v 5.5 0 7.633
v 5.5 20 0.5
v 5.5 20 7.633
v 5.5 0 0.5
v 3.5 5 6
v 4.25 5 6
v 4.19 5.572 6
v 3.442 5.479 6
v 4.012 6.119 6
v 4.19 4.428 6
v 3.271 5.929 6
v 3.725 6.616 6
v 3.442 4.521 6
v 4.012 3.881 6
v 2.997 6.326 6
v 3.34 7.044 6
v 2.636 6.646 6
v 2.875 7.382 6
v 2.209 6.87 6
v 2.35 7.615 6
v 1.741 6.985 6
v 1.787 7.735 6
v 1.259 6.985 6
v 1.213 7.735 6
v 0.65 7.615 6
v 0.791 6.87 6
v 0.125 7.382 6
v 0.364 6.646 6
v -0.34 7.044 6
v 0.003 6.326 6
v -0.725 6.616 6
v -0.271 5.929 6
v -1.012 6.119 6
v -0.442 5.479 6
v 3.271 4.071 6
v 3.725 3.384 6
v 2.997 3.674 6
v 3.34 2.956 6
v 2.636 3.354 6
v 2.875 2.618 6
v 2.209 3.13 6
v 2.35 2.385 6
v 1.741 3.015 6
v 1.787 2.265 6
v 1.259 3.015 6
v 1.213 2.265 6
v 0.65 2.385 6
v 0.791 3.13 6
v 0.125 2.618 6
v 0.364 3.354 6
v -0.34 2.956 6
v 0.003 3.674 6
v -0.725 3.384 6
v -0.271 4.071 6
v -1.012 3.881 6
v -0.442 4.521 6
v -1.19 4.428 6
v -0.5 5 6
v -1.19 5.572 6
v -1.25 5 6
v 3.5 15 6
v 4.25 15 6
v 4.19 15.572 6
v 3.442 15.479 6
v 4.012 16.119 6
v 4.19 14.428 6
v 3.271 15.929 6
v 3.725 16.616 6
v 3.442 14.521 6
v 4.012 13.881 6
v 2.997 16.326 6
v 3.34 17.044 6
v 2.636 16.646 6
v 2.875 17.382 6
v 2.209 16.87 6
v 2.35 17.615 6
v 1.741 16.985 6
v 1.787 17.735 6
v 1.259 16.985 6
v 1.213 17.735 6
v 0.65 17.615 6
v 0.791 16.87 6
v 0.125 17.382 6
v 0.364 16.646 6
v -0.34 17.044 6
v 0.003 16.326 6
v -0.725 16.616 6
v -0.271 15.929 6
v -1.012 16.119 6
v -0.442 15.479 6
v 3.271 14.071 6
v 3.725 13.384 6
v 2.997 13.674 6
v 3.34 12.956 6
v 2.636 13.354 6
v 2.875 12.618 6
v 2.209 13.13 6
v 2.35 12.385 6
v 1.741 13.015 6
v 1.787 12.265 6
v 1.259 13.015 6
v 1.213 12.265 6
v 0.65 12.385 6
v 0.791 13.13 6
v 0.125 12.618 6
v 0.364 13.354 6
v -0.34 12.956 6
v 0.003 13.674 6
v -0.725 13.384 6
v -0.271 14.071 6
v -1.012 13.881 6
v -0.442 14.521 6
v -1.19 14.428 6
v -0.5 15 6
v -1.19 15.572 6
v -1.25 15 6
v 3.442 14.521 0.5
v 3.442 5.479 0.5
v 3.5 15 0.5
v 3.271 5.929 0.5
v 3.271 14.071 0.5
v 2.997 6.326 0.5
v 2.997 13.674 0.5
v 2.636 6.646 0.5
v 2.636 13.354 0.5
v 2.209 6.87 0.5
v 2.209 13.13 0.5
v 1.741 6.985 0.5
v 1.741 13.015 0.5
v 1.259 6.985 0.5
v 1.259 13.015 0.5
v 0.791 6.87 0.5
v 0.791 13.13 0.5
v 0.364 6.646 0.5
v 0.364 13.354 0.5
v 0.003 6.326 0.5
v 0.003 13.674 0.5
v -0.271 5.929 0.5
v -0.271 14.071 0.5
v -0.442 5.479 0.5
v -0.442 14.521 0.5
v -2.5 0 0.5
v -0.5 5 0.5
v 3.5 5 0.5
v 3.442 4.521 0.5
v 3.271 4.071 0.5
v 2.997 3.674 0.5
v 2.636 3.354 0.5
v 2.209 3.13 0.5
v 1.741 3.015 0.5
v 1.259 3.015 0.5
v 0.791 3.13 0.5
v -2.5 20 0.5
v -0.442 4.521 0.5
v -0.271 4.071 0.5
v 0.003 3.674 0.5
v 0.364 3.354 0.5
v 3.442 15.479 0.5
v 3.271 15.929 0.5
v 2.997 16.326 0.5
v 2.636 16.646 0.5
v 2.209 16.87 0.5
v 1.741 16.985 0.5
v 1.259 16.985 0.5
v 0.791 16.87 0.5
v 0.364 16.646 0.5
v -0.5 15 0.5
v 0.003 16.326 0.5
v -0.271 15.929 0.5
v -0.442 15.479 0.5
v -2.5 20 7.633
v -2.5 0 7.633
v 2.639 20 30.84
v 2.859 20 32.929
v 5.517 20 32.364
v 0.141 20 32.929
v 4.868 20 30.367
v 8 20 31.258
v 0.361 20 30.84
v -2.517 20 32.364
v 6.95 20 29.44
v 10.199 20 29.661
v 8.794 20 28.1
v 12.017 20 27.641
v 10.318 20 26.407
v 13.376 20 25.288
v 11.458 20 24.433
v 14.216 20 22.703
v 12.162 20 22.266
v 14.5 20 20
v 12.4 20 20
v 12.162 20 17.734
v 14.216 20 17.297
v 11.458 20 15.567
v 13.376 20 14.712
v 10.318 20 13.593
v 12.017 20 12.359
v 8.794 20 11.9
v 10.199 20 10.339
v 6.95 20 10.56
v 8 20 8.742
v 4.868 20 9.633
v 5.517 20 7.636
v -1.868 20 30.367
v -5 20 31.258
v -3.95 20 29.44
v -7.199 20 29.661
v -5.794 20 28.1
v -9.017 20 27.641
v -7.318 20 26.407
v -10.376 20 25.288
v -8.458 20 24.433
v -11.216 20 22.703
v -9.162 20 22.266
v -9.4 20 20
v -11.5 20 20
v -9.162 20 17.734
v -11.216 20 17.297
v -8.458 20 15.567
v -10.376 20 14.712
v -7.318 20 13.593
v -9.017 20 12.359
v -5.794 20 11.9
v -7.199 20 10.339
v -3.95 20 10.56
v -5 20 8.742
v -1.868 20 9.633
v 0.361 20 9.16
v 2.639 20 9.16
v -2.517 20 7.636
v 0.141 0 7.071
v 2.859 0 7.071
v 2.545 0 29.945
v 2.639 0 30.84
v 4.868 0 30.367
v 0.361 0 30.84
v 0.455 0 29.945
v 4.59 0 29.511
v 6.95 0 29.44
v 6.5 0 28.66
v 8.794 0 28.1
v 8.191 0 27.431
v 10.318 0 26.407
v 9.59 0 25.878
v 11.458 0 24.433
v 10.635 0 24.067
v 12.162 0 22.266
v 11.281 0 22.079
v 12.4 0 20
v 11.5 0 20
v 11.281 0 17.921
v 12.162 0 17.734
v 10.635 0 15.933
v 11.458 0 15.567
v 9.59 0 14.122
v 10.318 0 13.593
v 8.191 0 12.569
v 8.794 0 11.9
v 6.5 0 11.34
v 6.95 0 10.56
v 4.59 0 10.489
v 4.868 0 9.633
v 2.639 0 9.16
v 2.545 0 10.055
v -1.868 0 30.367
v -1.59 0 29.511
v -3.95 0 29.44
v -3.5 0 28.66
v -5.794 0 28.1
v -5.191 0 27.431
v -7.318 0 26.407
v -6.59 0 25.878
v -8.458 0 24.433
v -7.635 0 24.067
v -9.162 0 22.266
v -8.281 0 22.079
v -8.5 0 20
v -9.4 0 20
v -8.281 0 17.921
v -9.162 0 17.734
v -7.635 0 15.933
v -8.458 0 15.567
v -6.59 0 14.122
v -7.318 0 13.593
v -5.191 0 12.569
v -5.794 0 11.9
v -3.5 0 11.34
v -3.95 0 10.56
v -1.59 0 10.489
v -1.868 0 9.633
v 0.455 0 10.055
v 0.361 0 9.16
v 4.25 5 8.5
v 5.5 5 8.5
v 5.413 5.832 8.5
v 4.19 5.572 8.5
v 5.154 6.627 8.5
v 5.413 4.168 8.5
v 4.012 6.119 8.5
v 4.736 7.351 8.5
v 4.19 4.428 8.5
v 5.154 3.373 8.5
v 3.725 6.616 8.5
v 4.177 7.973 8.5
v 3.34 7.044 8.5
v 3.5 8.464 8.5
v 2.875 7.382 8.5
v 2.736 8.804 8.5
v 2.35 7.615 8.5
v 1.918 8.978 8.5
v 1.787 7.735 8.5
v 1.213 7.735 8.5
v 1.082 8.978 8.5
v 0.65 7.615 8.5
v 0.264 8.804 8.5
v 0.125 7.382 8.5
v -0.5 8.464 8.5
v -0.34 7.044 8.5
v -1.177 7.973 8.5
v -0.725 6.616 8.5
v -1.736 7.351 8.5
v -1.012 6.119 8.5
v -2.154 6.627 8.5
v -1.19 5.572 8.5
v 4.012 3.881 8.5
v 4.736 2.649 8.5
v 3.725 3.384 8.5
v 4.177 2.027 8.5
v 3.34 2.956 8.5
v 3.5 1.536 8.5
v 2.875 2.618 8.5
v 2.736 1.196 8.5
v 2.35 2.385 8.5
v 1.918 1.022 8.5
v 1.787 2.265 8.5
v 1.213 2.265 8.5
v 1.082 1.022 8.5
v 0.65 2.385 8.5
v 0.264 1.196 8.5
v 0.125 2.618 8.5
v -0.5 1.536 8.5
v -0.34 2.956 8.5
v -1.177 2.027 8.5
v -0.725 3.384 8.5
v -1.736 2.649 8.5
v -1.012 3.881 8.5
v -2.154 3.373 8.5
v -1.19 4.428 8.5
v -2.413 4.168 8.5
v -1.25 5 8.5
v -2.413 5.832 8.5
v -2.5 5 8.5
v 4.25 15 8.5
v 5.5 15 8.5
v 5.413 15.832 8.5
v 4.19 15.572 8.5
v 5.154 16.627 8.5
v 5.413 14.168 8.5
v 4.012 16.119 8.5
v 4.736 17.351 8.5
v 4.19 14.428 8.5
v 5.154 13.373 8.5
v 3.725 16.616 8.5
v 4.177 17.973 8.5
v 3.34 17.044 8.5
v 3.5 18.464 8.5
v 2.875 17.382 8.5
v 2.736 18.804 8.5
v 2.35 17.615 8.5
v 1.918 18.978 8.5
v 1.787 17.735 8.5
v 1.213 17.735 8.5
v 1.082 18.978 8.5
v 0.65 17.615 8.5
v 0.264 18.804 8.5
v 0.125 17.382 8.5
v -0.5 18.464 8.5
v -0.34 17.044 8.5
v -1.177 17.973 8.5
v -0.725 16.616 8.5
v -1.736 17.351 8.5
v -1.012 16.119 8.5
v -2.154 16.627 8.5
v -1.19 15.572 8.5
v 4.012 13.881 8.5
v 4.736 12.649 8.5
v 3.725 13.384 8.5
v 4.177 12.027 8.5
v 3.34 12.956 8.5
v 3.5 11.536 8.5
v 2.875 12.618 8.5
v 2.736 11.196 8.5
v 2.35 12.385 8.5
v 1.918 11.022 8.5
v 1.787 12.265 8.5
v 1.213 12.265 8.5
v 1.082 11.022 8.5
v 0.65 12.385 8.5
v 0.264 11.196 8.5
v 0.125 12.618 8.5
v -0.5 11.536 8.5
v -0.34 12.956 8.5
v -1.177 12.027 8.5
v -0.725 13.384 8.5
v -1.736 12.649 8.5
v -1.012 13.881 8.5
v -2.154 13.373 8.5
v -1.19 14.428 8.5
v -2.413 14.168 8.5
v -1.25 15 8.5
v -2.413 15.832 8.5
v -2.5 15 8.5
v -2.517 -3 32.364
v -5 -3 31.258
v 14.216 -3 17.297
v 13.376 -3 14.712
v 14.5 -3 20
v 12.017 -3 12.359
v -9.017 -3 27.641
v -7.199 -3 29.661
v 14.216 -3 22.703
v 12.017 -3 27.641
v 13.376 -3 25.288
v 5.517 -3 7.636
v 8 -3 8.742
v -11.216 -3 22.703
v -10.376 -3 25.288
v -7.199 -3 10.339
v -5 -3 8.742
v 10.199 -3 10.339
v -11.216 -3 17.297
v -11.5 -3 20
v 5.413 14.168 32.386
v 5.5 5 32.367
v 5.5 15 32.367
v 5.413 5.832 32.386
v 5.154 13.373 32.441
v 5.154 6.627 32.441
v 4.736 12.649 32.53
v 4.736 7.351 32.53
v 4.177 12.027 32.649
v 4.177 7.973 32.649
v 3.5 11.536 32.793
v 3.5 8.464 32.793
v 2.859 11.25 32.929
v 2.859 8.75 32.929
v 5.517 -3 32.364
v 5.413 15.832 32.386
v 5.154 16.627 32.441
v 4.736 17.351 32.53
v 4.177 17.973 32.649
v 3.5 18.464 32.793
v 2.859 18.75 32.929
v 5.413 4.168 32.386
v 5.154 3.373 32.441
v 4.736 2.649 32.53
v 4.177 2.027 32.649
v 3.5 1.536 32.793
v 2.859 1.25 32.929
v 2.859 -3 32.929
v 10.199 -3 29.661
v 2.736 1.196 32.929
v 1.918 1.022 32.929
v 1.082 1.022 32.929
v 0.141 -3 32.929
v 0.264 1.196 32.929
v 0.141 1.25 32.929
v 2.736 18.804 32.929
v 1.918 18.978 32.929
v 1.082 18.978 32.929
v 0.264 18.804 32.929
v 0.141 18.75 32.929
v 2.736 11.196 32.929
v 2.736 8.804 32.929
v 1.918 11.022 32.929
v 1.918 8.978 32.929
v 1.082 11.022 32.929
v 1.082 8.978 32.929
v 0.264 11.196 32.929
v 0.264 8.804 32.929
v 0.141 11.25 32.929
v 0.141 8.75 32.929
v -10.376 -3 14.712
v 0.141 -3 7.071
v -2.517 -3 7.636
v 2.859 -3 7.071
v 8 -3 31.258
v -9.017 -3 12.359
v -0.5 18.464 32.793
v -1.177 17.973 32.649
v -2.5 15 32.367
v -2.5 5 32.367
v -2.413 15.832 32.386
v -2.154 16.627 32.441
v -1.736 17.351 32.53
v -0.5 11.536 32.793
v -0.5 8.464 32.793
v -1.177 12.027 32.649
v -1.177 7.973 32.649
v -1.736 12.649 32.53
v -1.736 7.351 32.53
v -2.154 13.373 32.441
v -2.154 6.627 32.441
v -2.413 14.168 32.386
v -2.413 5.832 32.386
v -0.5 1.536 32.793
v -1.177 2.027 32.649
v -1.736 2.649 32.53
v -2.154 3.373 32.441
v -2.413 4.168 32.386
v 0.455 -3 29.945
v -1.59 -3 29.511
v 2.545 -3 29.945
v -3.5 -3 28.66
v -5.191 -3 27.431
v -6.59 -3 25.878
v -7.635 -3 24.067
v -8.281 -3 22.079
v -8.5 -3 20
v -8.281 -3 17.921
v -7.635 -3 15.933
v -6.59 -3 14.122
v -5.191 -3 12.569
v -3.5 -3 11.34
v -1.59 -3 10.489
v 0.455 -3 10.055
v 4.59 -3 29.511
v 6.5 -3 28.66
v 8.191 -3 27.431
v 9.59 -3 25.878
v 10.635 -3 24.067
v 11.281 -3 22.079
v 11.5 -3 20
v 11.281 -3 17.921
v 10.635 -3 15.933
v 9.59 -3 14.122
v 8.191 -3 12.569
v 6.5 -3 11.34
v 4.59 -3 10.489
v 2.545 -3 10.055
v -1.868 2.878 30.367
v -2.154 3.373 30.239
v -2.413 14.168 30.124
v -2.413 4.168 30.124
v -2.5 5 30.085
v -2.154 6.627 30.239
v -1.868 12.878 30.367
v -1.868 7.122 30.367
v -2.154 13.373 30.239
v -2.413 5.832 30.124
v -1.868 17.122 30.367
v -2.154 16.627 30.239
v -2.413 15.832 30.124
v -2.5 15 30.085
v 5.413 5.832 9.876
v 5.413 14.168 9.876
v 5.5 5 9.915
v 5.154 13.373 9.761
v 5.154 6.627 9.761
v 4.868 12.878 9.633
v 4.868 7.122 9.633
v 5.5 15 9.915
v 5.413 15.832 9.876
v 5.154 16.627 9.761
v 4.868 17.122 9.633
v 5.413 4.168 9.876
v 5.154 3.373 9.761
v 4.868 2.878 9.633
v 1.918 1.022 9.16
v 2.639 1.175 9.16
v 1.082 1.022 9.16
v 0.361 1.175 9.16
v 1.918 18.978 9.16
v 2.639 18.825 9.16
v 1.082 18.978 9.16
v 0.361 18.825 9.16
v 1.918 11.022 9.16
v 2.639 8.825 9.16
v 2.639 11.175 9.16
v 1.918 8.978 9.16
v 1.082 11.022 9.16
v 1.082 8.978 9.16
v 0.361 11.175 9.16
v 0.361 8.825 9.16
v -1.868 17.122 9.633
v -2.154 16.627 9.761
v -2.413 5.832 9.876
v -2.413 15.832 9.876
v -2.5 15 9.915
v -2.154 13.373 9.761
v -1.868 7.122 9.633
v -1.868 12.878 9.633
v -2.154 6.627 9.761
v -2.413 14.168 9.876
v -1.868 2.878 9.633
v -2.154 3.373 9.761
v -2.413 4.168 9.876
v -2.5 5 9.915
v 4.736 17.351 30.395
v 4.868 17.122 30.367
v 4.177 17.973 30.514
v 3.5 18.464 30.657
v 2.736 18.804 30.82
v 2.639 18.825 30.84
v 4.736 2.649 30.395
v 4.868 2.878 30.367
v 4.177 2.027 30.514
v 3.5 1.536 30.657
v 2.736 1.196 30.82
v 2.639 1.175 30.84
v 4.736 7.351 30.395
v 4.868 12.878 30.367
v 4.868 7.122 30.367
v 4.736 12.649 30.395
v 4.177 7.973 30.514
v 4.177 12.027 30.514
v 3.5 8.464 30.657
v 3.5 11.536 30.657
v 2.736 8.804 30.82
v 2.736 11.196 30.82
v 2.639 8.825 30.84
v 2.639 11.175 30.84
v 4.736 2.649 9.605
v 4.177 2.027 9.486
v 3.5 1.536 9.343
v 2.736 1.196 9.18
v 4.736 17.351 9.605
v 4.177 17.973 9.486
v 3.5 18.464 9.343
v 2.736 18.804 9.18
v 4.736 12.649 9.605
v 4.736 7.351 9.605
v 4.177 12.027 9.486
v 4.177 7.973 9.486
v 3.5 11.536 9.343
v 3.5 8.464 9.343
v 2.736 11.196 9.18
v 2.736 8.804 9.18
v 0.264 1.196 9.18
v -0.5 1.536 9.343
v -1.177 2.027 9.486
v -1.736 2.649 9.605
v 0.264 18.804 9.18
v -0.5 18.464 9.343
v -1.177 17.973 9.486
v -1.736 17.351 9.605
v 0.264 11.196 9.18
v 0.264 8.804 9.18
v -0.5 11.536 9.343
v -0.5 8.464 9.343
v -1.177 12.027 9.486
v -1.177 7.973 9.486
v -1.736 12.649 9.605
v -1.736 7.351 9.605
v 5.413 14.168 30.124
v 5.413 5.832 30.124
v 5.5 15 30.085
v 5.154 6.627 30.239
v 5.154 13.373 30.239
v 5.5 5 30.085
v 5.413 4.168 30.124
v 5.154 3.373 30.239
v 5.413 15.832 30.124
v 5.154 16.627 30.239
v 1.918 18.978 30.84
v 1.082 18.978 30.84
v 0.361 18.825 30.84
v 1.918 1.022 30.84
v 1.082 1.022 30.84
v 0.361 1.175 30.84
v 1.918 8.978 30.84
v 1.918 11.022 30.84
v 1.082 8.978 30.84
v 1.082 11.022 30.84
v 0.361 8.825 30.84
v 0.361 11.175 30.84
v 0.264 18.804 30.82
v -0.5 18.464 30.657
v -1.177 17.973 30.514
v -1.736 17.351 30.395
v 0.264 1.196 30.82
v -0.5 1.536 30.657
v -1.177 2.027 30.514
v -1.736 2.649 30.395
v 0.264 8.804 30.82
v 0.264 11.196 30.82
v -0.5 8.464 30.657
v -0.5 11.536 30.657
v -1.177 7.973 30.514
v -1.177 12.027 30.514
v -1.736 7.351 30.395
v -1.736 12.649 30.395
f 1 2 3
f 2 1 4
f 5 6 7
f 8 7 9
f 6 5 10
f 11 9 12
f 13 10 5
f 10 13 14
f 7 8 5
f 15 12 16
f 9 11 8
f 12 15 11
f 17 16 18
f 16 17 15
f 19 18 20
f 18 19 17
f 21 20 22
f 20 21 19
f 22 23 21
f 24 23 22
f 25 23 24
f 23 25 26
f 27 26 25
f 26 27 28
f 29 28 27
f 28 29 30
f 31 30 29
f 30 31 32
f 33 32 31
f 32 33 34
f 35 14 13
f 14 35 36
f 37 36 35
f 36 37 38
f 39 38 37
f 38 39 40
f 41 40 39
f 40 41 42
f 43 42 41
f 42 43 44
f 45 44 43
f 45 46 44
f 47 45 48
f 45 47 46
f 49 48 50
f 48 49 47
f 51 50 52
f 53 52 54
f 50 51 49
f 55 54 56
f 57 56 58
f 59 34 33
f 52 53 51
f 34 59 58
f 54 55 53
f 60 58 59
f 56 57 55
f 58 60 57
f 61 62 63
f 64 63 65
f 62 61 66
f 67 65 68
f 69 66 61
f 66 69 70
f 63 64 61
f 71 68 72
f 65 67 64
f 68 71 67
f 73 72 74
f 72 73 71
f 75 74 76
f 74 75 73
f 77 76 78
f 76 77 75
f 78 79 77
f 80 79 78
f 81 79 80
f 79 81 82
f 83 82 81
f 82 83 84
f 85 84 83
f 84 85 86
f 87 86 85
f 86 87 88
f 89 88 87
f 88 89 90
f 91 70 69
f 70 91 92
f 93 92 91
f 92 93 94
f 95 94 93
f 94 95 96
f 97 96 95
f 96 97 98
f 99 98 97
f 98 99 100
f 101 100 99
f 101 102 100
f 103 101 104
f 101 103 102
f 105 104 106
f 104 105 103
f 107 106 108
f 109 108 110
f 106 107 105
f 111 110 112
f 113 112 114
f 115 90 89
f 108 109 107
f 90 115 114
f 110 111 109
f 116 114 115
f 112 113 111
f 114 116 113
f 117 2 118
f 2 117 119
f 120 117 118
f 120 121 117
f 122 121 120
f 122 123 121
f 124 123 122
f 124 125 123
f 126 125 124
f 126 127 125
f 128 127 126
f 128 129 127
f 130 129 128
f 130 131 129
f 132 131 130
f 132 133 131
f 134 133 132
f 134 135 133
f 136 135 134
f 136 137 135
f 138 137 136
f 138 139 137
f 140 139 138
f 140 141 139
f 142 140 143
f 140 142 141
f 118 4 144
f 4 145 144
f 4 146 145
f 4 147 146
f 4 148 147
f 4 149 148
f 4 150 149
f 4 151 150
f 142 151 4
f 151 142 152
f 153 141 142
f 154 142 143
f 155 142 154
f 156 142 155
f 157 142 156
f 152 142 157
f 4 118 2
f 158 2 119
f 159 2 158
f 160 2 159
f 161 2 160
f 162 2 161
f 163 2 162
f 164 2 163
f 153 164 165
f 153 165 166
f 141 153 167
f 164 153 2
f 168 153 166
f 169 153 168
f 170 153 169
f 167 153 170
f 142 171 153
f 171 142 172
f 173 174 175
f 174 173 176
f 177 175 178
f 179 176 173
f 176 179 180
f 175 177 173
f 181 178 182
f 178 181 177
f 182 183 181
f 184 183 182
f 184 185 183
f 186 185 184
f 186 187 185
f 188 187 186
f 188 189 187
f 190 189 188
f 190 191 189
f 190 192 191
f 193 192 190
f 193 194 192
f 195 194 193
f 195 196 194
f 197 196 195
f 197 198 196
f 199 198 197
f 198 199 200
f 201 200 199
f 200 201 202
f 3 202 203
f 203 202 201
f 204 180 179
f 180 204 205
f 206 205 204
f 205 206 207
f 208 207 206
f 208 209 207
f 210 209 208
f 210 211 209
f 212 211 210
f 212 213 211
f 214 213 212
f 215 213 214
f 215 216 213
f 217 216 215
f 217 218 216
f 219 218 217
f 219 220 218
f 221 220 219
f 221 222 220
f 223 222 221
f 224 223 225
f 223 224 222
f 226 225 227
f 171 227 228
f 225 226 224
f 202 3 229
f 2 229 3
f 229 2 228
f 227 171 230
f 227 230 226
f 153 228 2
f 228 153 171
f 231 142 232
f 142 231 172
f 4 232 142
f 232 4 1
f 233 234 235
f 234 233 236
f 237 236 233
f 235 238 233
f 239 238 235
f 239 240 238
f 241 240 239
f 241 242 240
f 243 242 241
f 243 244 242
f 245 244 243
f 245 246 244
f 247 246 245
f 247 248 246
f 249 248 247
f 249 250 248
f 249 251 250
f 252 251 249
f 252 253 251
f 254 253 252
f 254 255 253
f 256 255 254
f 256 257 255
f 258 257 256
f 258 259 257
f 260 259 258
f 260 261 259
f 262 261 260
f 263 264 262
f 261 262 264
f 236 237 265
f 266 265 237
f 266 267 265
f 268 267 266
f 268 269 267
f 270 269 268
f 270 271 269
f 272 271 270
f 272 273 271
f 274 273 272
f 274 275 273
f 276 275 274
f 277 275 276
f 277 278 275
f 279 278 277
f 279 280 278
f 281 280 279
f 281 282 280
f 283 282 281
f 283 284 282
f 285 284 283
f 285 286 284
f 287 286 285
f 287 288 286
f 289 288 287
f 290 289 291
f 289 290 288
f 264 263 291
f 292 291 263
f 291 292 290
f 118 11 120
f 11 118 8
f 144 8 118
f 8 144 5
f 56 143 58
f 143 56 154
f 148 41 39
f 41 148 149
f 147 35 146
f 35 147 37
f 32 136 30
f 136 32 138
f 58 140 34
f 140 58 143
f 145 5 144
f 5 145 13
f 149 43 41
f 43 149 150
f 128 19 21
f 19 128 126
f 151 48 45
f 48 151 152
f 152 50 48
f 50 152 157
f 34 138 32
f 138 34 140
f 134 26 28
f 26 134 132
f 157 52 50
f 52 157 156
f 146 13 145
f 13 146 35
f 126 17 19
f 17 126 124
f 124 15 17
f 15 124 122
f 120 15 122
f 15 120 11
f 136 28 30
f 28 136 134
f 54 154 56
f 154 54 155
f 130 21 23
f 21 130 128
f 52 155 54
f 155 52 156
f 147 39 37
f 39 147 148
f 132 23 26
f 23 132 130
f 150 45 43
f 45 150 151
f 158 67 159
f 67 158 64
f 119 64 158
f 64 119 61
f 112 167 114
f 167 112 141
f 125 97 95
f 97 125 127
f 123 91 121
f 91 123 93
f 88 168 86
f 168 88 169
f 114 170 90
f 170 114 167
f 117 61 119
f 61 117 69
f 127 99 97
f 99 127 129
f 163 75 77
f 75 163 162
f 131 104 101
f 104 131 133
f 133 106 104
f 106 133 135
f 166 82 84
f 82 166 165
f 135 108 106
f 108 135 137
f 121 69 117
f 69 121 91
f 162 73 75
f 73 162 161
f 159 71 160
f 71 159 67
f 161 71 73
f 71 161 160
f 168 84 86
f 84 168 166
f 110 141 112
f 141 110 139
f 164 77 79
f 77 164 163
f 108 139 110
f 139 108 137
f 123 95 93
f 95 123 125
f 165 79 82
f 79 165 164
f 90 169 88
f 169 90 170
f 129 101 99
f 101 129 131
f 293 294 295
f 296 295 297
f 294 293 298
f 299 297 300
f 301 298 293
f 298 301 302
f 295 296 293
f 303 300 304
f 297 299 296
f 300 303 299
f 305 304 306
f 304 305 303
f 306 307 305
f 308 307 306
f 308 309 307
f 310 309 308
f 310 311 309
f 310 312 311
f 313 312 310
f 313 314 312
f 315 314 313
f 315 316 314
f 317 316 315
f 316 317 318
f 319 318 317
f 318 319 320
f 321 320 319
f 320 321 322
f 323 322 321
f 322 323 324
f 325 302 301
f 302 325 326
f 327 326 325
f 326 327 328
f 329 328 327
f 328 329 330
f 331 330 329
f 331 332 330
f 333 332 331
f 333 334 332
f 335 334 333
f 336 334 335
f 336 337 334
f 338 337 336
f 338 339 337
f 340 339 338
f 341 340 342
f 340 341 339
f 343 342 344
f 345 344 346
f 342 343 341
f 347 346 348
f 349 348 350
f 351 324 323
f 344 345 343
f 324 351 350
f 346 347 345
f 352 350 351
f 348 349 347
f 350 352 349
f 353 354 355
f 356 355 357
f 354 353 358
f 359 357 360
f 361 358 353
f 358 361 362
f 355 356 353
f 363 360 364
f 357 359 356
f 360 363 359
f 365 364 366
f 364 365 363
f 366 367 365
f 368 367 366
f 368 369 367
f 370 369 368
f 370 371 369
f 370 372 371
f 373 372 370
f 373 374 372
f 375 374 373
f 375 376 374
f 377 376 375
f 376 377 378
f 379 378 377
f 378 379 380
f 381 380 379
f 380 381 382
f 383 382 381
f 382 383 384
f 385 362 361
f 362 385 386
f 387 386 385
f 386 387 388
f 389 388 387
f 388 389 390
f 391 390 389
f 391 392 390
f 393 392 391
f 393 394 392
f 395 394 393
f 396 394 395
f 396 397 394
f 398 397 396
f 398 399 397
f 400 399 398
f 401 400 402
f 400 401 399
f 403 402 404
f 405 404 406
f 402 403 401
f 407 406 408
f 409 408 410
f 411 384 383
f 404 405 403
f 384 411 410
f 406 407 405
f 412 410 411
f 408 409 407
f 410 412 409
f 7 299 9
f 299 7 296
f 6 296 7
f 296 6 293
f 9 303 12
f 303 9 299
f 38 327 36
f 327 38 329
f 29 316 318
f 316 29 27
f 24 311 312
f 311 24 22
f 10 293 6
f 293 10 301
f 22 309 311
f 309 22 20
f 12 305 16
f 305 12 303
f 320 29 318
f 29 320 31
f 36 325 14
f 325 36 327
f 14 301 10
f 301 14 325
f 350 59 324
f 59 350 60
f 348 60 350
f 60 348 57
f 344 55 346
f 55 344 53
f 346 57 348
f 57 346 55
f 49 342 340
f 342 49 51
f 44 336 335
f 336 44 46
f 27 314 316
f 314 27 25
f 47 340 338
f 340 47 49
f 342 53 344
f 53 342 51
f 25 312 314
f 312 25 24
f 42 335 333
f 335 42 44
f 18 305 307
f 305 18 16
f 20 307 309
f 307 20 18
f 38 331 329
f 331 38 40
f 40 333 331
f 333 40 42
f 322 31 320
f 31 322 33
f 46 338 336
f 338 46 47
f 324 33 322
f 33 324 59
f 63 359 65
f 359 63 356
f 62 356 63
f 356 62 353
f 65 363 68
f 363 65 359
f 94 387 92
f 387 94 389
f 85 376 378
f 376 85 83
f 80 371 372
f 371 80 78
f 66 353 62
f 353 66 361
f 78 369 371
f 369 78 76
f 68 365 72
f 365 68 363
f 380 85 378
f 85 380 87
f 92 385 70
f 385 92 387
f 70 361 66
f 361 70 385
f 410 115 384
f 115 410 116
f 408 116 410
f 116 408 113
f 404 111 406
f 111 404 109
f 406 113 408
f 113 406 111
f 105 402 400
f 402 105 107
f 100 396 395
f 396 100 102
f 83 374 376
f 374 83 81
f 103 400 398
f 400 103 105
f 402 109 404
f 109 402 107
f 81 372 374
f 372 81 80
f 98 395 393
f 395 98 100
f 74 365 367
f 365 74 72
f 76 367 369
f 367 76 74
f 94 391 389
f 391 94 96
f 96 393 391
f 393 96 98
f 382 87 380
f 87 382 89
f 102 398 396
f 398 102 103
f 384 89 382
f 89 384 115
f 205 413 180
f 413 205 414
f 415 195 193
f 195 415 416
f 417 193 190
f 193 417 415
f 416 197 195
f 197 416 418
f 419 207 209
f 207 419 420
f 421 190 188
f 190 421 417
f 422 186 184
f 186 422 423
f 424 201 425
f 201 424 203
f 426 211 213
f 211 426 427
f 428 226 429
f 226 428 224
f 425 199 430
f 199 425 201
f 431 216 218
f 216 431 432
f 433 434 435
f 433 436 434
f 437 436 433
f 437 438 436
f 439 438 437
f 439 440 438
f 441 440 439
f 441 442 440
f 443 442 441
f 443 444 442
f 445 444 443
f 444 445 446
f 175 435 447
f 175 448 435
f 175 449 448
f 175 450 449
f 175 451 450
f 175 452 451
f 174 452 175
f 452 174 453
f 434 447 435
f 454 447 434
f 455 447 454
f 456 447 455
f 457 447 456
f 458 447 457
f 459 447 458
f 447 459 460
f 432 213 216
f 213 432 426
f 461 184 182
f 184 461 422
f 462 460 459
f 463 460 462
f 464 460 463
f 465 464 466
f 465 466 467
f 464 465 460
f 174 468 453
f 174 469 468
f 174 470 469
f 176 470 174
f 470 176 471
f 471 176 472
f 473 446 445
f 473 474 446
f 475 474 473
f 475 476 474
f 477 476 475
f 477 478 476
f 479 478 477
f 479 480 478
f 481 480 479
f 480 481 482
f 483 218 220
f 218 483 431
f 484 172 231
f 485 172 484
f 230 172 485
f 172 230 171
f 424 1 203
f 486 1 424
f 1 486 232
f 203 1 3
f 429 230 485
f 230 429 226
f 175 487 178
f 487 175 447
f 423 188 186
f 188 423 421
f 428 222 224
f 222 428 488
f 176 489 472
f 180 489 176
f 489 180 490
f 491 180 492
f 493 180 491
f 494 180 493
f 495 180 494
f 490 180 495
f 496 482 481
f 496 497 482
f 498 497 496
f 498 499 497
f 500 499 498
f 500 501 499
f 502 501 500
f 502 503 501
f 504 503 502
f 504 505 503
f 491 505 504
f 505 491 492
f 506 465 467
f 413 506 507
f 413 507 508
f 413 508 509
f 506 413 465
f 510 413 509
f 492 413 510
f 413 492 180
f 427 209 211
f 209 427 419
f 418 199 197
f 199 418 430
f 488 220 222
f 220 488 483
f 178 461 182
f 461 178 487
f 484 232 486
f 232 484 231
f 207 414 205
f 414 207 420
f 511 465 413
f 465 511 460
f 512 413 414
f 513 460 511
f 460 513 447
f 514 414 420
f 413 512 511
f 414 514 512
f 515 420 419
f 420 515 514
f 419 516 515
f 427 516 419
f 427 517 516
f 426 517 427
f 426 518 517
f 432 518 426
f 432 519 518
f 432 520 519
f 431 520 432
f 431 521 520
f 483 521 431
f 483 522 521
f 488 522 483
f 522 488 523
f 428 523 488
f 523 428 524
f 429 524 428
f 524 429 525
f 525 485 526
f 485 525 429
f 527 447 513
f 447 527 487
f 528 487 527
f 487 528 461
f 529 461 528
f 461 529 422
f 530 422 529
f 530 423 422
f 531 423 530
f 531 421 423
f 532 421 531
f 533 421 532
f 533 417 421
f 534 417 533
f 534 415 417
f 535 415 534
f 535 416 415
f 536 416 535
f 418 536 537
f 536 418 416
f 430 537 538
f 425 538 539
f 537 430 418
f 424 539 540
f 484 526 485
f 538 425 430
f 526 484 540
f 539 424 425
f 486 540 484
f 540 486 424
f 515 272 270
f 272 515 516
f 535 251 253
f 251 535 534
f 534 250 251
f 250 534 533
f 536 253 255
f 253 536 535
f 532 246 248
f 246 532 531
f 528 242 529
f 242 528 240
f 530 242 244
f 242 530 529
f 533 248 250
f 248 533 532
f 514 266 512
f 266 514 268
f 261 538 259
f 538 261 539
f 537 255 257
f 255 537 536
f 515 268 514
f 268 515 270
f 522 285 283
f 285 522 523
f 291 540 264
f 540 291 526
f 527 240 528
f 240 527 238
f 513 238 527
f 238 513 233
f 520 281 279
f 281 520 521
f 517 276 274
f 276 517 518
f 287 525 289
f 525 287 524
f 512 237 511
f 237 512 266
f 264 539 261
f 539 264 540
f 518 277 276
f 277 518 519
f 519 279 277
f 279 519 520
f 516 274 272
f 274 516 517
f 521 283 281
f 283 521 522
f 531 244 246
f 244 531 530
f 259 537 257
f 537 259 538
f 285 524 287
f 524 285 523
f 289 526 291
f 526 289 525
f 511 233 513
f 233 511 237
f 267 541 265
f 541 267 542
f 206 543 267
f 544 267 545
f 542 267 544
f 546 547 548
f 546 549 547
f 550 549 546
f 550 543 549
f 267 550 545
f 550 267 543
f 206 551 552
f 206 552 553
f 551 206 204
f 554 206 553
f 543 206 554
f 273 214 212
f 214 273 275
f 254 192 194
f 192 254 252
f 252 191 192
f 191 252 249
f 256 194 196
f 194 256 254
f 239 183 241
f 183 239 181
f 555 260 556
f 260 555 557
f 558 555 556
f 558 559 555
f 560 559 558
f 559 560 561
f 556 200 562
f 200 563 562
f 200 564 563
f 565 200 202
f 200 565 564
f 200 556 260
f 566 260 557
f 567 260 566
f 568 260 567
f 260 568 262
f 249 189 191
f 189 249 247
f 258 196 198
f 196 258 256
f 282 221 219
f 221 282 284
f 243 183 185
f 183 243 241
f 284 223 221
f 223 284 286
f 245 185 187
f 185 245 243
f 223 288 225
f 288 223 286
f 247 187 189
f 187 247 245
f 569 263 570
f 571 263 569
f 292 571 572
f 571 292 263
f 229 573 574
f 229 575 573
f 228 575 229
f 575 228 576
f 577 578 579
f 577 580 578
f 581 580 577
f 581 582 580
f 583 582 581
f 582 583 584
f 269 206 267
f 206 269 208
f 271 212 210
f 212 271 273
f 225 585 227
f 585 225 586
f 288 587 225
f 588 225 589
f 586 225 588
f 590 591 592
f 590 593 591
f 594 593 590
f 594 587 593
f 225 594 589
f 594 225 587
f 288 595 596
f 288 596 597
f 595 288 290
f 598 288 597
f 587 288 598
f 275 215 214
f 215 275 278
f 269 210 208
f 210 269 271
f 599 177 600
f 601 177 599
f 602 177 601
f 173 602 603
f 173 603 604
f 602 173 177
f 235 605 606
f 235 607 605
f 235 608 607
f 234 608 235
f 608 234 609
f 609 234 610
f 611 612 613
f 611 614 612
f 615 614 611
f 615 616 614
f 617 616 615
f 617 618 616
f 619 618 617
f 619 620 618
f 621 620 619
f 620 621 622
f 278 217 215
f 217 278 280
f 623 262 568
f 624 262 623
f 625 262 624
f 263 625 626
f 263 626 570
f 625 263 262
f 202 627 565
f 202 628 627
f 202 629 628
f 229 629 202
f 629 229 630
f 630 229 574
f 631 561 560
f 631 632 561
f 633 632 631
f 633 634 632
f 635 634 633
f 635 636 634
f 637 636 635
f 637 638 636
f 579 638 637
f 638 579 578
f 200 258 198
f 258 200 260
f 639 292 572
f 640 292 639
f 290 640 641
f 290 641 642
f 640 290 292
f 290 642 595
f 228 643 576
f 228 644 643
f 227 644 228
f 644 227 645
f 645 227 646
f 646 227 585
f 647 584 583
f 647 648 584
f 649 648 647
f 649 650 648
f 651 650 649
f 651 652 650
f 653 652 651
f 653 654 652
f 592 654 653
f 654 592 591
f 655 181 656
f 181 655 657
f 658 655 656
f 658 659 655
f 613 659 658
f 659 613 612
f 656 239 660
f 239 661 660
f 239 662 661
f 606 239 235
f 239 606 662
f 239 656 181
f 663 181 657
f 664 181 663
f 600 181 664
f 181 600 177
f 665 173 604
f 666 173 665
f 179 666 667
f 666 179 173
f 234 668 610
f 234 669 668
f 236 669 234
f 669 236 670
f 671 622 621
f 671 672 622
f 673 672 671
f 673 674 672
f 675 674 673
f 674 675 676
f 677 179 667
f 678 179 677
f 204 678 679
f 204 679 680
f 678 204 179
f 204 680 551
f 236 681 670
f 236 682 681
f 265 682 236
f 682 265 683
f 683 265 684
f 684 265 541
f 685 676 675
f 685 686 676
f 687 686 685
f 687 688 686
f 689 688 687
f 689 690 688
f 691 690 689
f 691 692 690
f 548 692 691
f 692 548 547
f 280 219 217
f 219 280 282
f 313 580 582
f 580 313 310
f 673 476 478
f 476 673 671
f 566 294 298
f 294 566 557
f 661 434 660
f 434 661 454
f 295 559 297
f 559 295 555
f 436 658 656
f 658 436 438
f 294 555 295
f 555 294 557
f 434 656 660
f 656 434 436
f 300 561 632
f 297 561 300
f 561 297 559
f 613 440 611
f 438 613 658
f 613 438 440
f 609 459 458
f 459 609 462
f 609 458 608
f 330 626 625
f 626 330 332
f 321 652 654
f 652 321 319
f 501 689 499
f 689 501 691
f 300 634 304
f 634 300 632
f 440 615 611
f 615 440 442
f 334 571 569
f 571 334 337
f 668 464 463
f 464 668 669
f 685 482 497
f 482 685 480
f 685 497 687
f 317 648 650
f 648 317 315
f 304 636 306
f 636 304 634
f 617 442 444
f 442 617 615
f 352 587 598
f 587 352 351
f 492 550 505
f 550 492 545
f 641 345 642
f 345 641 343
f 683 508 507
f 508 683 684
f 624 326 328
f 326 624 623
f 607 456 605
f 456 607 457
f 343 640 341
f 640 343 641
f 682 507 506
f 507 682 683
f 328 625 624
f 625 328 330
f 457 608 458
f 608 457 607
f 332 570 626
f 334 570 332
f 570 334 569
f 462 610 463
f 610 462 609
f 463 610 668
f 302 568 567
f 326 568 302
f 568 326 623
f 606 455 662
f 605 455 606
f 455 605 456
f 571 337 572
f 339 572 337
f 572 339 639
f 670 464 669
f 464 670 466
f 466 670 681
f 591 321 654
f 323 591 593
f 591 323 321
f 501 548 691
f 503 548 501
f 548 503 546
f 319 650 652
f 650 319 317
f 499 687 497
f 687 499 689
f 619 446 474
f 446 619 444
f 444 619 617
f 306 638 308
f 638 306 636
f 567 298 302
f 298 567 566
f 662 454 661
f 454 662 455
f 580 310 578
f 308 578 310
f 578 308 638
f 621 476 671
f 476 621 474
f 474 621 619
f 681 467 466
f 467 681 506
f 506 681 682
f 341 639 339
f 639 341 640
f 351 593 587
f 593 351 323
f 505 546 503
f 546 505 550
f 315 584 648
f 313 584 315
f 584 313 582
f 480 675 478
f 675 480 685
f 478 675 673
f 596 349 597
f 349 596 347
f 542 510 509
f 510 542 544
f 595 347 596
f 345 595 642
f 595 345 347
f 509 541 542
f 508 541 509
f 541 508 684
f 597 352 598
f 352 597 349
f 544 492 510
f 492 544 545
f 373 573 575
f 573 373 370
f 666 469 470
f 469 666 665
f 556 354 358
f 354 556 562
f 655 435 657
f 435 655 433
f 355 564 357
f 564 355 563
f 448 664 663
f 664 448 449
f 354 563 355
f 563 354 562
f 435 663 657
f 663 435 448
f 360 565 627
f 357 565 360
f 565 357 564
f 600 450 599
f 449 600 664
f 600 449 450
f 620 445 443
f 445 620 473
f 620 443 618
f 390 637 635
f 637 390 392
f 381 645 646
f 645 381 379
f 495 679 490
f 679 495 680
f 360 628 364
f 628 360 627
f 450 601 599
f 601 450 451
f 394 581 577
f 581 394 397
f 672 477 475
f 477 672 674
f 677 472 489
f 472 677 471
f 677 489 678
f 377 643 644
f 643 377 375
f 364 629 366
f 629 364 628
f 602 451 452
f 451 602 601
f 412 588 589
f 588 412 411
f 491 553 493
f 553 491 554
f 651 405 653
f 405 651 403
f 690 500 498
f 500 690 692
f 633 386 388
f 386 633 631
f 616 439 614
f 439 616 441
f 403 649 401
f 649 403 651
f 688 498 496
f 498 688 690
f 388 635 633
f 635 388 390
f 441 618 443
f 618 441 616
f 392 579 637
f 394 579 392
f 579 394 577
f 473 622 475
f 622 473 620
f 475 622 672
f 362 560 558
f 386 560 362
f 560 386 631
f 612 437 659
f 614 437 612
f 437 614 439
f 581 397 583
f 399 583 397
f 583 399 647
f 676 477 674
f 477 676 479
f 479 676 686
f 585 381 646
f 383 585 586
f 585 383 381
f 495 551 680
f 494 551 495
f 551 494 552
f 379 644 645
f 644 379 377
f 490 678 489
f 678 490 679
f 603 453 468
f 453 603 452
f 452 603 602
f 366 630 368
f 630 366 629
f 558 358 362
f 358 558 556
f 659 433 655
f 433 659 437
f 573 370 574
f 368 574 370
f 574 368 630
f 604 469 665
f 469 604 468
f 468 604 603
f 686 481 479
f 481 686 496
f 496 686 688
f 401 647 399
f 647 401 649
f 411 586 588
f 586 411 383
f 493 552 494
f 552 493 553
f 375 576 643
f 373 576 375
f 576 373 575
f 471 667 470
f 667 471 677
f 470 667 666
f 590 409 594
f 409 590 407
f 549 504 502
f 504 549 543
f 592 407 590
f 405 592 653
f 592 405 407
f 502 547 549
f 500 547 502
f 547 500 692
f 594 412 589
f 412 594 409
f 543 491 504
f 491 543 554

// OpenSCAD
union(){
    $fs = 0.5;
    difference(){
        translate([-2.5,0,0.5])
            cube([8,20,5.5]);
        translate([1.5,5,0.5])    
            cylinder(h=5.5, d=4);
        translate([1.5,15,0.5])    
            cylinder(h=5.5, d=4);
    }
    difference(){
        translate([-2.5,0,5.5])
            cube([8,20,3]);
        translate([1.5,5,5.5])
            cylinder(h=3, d=5.5);
        translate([1.5,15,5.5])
            cylinder(h=3, d=5.5);  
    }
    translate([1.5,-3,20])
        rotate([270,0,0])
        difference(){
            cylinder(h=3, d=26);
            cylinder(h=3, d=20);
            }
    difference(){
        translate([1.5,0,20])
            rotate([270,0,0])
            difference(){
                cylinder(h=20, d=26);
                cylinder(h=20, d=21.8);
            }
        translate([1.5,5,7])
            rotate([0,0,0])
            cylinder(h=30, d=8);  
        translate([1.5,15,7])
            rotate([0,0,0])
            cylinder(h=30, d=8);
    }       
}
